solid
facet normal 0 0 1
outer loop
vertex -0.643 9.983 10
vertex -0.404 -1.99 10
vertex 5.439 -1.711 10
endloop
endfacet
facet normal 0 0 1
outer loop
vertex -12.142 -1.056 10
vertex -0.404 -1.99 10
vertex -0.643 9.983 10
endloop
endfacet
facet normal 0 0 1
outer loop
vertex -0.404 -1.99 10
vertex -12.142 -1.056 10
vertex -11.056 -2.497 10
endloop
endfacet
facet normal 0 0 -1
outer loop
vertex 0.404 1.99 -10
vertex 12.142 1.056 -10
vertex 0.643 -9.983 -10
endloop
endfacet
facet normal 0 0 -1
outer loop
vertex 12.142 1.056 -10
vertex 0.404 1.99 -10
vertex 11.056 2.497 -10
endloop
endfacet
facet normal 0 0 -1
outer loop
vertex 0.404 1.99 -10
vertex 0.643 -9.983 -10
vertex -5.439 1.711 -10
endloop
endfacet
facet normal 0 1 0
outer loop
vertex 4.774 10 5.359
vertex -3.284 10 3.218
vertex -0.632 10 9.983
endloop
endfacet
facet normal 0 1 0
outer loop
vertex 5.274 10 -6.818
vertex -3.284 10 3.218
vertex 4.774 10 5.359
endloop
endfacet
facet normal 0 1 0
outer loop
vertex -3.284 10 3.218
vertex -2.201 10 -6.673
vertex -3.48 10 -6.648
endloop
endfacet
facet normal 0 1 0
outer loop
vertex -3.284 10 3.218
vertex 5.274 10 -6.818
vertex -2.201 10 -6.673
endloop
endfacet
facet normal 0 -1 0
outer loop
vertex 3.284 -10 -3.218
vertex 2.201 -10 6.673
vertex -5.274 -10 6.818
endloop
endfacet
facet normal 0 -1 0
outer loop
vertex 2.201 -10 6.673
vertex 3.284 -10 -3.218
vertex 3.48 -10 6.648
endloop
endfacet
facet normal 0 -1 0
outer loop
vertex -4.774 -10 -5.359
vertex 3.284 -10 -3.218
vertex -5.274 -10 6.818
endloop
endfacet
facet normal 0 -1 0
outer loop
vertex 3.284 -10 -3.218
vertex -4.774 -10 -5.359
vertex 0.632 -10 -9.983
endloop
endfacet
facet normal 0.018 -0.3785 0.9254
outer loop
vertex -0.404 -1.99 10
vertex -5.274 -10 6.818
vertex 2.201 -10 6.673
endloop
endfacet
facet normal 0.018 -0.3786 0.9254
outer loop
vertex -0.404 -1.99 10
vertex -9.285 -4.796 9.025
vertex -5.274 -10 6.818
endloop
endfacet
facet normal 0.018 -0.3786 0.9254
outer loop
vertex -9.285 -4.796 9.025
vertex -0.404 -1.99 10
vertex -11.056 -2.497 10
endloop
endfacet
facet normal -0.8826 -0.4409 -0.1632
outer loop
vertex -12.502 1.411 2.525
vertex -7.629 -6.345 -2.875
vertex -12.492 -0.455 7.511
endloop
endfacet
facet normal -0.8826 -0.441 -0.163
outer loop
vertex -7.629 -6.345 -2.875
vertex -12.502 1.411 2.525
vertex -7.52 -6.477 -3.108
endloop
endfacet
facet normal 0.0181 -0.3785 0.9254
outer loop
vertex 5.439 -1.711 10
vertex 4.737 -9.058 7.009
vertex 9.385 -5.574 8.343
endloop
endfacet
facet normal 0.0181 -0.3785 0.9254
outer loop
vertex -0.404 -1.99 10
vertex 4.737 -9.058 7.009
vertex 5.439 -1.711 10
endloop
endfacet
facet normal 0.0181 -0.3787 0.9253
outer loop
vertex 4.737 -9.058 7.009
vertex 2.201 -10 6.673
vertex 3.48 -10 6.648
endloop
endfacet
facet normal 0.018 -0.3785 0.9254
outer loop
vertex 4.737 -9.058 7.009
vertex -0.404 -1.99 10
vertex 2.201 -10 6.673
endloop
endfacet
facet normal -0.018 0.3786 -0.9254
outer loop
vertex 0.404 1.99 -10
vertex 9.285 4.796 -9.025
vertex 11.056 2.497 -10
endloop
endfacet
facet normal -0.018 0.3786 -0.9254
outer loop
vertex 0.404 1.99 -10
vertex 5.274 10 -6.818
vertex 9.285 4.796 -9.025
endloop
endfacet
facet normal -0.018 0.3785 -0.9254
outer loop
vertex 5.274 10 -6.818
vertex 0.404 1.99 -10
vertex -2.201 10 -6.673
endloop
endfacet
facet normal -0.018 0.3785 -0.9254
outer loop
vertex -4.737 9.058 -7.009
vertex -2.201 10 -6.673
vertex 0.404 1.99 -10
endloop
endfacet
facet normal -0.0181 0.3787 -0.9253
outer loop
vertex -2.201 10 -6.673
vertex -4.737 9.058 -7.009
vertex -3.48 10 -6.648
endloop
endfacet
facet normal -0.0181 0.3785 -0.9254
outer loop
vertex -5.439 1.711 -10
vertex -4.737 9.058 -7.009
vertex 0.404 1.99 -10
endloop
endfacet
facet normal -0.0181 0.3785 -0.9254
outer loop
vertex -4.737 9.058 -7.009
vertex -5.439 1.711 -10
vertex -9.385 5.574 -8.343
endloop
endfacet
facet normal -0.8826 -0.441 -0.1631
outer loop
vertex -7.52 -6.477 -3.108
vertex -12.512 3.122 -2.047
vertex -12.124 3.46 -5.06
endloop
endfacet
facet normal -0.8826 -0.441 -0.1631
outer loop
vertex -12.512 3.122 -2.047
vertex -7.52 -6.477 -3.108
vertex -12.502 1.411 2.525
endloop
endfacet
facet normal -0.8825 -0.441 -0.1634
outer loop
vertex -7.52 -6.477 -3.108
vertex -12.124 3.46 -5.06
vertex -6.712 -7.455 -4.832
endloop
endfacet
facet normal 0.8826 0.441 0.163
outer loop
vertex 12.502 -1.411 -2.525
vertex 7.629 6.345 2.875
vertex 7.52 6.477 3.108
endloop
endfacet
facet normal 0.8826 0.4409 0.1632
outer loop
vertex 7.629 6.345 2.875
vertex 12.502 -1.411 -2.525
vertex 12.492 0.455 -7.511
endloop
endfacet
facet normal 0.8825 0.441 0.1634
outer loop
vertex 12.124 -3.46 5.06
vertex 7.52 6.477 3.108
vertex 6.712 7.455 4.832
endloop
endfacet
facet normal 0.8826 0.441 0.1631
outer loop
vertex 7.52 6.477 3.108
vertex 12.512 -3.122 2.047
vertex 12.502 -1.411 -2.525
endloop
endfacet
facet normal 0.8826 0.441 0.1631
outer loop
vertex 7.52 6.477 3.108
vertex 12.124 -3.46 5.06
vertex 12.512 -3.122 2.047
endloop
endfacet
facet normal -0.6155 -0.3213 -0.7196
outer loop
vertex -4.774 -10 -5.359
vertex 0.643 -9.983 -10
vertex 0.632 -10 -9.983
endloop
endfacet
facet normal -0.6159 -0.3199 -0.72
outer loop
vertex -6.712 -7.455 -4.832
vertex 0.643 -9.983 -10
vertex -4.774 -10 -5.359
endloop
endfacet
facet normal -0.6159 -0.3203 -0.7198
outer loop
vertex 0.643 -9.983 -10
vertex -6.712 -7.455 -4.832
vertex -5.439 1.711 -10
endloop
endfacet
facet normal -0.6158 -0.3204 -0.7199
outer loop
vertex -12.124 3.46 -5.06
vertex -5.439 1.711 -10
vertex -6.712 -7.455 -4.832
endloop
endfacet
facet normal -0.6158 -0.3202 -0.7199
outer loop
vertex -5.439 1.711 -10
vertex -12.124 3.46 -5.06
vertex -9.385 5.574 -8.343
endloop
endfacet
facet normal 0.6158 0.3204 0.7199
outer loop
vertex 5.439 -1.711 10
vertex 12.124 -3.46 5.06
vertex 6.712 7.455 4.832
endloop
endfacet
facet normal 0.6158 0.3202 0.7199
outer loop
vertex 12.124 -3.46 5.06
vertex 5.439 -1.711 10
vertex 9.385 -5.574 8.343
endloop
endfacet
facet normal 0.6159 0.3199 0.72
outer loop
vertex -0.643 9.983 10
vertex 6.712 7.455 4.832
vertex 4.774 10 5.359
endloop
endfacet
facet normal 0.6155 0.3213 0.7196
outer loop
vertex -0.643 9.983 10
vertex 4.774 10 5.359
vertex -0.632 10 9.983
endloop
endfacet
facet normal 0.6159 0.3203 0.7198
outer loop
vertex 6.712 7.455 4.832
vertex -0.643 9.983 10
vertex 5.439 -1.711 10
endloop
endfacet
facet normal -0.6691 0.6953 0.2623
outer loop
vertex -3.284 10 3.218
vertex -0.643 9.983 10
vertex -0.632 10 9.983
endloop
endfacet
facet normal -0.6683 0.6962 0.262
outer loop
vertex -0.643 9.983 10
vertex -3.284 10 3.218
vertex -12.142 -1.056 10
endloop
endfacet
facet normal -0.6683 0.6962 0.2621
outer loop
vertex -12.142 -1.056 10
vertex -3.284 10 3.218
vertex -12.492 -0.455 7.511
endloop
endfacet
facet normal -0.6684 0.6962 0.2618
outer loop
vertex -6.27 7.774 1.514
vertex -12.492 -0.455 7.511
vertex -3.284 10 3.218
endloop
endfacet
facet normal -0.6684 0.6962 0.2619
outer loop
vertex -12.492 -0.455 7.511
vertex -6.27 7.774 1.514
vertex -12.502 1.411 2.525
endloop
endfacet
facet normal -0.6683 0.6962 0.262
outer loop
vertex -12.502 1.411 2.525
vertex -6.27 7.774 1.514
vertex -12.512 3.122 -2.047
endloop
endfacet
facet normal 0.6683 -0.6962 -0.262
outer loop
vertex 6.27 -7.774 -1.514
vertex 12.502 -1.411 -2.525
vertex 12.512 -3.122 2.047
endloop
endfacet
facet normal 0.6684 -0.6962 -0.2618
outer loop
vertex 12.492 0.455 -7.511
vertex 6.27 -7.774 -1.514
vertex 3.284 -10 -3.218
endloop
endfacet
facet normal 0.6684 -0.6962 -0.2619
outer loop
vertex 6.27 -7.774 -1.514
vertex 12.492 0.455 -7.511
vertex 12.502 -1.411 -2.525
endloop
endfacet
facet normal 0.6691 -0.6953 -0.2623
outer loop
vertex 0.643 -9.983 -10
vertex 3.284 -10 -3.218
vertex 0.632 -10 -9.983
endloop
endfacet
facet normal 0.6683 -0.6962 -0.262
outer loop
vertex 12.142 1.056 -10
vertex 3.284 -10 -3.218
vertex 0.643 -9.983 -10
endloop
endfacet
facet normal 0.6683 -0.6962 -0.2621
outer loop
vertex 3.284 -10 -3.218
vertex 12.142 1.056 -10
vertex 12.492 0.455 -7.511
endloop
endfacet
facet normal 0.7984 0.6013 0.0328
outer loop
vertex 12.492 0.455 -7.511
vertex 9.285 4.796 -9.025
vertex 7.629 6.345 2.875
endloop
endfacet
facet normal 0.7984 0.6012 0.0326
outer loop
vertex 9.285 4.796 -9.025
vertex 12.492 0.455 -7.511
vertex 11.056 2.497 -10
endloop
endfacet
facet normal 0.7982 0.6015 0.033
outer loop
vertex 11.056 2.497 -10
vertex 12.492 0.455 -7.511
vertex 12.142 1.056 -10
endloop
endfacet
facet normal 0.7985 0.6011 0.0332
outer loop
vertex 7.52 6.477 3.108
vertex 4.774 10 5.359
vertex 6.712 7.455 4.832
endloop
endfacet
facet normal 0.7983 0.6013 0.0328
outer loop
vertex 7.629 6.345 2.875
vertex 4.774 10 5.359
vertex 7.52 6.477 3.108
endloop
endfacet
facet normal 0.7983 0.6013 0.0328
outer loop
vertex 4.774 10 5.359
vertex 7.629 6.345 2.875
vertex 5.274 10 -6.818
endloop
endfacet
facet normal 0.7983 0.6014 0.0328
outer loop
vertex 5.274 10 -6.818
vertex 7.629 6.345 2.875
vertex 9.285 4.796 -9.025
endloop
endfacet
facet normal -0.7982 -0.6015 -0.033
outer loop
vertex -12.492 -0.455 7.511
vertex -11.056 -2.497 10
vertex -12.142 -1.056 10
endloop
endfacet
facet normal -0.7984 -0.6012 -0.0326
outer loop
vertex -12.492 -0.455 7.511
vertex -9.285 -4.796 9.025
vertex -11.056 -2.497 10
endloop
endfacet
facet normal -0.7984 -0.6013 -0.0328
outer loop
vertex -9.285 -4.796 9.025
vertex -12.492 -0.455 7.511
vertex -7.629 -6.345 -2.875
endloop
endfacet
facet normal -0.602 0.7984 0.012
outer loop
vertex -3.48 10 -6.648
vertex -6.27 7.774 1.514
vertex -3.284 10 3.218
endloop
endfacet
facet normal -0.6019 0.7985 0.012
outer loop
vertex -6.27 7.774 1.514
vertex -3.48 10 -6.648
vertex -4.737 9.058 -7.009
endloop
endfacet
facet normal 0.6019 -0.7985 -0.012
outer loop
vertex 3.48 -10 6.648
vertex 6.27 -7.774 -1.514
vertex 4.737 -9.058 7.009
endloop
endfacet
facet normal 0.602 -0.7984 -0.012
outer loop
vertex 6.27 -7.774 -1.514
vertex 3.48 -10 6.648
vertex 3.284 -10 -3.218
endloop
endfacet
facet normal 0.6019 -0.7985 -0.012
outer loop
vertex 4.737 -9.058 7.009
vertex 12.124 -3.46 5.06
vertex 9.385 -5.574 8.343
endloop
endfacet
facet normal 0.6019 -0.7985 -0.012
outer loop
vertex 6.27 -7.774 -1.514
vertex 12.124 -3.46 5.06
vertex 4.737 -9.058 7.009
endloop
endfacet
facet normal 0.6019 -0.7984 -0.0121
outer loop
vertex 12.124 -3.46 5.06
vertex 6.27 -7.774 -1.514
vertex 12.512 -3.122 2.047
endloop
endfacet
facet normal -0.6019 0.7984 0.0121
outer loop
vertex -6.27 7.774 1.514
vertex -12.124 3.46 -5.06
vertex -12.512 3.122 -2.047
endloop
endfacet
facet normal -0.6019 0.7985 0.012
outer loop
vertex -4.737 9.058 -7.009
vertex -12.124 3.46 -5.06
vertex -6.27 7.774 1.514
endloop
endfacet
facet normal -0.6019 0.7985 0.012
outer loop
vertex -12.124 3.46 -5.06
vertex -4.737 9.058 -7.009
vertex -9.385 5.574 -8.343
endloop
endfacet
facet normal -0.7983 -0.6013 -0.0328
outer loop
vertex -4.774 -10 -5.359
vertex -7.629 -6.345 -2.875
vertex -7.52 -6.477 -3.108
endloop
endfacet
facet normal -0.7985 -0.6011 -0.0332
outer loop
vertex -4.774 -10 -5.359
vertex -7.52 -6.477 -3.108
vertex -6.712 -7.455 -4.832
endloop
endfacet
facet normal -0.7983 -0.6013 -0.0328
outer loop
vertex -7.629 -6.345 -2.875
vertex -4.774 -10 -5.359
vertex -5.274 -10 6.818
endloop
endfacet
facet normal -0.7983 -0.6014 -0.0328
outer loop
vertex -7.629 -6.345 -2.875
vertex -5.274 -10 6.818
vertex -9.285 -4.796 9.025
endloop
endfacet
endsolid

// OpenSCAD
echo(version=version());

intersection_for(i = [
			[0, 0, 0],
			[10, 20, 300],
			[200, 40, 57],
			[20, 88, 57]
		])
	rotate(i) cube([100, 20, 20], center = true);

// Written by Clifford Wolf <clifford@clifford.at> and Marius
// Kintel <marius@kintel.net>
//
// To the extent possible under law, the author(s) have dedicated all
// copyright and related and neighboring rights to this software to the
// public domain worldwide. This software is distributed without any
// warranty.
//
// You should have received a copy of the CC0 Public Domain
// Dedication along with this software.
// If not, see <http://creativecommons.org/publicdomain/zero/1.0/>.
